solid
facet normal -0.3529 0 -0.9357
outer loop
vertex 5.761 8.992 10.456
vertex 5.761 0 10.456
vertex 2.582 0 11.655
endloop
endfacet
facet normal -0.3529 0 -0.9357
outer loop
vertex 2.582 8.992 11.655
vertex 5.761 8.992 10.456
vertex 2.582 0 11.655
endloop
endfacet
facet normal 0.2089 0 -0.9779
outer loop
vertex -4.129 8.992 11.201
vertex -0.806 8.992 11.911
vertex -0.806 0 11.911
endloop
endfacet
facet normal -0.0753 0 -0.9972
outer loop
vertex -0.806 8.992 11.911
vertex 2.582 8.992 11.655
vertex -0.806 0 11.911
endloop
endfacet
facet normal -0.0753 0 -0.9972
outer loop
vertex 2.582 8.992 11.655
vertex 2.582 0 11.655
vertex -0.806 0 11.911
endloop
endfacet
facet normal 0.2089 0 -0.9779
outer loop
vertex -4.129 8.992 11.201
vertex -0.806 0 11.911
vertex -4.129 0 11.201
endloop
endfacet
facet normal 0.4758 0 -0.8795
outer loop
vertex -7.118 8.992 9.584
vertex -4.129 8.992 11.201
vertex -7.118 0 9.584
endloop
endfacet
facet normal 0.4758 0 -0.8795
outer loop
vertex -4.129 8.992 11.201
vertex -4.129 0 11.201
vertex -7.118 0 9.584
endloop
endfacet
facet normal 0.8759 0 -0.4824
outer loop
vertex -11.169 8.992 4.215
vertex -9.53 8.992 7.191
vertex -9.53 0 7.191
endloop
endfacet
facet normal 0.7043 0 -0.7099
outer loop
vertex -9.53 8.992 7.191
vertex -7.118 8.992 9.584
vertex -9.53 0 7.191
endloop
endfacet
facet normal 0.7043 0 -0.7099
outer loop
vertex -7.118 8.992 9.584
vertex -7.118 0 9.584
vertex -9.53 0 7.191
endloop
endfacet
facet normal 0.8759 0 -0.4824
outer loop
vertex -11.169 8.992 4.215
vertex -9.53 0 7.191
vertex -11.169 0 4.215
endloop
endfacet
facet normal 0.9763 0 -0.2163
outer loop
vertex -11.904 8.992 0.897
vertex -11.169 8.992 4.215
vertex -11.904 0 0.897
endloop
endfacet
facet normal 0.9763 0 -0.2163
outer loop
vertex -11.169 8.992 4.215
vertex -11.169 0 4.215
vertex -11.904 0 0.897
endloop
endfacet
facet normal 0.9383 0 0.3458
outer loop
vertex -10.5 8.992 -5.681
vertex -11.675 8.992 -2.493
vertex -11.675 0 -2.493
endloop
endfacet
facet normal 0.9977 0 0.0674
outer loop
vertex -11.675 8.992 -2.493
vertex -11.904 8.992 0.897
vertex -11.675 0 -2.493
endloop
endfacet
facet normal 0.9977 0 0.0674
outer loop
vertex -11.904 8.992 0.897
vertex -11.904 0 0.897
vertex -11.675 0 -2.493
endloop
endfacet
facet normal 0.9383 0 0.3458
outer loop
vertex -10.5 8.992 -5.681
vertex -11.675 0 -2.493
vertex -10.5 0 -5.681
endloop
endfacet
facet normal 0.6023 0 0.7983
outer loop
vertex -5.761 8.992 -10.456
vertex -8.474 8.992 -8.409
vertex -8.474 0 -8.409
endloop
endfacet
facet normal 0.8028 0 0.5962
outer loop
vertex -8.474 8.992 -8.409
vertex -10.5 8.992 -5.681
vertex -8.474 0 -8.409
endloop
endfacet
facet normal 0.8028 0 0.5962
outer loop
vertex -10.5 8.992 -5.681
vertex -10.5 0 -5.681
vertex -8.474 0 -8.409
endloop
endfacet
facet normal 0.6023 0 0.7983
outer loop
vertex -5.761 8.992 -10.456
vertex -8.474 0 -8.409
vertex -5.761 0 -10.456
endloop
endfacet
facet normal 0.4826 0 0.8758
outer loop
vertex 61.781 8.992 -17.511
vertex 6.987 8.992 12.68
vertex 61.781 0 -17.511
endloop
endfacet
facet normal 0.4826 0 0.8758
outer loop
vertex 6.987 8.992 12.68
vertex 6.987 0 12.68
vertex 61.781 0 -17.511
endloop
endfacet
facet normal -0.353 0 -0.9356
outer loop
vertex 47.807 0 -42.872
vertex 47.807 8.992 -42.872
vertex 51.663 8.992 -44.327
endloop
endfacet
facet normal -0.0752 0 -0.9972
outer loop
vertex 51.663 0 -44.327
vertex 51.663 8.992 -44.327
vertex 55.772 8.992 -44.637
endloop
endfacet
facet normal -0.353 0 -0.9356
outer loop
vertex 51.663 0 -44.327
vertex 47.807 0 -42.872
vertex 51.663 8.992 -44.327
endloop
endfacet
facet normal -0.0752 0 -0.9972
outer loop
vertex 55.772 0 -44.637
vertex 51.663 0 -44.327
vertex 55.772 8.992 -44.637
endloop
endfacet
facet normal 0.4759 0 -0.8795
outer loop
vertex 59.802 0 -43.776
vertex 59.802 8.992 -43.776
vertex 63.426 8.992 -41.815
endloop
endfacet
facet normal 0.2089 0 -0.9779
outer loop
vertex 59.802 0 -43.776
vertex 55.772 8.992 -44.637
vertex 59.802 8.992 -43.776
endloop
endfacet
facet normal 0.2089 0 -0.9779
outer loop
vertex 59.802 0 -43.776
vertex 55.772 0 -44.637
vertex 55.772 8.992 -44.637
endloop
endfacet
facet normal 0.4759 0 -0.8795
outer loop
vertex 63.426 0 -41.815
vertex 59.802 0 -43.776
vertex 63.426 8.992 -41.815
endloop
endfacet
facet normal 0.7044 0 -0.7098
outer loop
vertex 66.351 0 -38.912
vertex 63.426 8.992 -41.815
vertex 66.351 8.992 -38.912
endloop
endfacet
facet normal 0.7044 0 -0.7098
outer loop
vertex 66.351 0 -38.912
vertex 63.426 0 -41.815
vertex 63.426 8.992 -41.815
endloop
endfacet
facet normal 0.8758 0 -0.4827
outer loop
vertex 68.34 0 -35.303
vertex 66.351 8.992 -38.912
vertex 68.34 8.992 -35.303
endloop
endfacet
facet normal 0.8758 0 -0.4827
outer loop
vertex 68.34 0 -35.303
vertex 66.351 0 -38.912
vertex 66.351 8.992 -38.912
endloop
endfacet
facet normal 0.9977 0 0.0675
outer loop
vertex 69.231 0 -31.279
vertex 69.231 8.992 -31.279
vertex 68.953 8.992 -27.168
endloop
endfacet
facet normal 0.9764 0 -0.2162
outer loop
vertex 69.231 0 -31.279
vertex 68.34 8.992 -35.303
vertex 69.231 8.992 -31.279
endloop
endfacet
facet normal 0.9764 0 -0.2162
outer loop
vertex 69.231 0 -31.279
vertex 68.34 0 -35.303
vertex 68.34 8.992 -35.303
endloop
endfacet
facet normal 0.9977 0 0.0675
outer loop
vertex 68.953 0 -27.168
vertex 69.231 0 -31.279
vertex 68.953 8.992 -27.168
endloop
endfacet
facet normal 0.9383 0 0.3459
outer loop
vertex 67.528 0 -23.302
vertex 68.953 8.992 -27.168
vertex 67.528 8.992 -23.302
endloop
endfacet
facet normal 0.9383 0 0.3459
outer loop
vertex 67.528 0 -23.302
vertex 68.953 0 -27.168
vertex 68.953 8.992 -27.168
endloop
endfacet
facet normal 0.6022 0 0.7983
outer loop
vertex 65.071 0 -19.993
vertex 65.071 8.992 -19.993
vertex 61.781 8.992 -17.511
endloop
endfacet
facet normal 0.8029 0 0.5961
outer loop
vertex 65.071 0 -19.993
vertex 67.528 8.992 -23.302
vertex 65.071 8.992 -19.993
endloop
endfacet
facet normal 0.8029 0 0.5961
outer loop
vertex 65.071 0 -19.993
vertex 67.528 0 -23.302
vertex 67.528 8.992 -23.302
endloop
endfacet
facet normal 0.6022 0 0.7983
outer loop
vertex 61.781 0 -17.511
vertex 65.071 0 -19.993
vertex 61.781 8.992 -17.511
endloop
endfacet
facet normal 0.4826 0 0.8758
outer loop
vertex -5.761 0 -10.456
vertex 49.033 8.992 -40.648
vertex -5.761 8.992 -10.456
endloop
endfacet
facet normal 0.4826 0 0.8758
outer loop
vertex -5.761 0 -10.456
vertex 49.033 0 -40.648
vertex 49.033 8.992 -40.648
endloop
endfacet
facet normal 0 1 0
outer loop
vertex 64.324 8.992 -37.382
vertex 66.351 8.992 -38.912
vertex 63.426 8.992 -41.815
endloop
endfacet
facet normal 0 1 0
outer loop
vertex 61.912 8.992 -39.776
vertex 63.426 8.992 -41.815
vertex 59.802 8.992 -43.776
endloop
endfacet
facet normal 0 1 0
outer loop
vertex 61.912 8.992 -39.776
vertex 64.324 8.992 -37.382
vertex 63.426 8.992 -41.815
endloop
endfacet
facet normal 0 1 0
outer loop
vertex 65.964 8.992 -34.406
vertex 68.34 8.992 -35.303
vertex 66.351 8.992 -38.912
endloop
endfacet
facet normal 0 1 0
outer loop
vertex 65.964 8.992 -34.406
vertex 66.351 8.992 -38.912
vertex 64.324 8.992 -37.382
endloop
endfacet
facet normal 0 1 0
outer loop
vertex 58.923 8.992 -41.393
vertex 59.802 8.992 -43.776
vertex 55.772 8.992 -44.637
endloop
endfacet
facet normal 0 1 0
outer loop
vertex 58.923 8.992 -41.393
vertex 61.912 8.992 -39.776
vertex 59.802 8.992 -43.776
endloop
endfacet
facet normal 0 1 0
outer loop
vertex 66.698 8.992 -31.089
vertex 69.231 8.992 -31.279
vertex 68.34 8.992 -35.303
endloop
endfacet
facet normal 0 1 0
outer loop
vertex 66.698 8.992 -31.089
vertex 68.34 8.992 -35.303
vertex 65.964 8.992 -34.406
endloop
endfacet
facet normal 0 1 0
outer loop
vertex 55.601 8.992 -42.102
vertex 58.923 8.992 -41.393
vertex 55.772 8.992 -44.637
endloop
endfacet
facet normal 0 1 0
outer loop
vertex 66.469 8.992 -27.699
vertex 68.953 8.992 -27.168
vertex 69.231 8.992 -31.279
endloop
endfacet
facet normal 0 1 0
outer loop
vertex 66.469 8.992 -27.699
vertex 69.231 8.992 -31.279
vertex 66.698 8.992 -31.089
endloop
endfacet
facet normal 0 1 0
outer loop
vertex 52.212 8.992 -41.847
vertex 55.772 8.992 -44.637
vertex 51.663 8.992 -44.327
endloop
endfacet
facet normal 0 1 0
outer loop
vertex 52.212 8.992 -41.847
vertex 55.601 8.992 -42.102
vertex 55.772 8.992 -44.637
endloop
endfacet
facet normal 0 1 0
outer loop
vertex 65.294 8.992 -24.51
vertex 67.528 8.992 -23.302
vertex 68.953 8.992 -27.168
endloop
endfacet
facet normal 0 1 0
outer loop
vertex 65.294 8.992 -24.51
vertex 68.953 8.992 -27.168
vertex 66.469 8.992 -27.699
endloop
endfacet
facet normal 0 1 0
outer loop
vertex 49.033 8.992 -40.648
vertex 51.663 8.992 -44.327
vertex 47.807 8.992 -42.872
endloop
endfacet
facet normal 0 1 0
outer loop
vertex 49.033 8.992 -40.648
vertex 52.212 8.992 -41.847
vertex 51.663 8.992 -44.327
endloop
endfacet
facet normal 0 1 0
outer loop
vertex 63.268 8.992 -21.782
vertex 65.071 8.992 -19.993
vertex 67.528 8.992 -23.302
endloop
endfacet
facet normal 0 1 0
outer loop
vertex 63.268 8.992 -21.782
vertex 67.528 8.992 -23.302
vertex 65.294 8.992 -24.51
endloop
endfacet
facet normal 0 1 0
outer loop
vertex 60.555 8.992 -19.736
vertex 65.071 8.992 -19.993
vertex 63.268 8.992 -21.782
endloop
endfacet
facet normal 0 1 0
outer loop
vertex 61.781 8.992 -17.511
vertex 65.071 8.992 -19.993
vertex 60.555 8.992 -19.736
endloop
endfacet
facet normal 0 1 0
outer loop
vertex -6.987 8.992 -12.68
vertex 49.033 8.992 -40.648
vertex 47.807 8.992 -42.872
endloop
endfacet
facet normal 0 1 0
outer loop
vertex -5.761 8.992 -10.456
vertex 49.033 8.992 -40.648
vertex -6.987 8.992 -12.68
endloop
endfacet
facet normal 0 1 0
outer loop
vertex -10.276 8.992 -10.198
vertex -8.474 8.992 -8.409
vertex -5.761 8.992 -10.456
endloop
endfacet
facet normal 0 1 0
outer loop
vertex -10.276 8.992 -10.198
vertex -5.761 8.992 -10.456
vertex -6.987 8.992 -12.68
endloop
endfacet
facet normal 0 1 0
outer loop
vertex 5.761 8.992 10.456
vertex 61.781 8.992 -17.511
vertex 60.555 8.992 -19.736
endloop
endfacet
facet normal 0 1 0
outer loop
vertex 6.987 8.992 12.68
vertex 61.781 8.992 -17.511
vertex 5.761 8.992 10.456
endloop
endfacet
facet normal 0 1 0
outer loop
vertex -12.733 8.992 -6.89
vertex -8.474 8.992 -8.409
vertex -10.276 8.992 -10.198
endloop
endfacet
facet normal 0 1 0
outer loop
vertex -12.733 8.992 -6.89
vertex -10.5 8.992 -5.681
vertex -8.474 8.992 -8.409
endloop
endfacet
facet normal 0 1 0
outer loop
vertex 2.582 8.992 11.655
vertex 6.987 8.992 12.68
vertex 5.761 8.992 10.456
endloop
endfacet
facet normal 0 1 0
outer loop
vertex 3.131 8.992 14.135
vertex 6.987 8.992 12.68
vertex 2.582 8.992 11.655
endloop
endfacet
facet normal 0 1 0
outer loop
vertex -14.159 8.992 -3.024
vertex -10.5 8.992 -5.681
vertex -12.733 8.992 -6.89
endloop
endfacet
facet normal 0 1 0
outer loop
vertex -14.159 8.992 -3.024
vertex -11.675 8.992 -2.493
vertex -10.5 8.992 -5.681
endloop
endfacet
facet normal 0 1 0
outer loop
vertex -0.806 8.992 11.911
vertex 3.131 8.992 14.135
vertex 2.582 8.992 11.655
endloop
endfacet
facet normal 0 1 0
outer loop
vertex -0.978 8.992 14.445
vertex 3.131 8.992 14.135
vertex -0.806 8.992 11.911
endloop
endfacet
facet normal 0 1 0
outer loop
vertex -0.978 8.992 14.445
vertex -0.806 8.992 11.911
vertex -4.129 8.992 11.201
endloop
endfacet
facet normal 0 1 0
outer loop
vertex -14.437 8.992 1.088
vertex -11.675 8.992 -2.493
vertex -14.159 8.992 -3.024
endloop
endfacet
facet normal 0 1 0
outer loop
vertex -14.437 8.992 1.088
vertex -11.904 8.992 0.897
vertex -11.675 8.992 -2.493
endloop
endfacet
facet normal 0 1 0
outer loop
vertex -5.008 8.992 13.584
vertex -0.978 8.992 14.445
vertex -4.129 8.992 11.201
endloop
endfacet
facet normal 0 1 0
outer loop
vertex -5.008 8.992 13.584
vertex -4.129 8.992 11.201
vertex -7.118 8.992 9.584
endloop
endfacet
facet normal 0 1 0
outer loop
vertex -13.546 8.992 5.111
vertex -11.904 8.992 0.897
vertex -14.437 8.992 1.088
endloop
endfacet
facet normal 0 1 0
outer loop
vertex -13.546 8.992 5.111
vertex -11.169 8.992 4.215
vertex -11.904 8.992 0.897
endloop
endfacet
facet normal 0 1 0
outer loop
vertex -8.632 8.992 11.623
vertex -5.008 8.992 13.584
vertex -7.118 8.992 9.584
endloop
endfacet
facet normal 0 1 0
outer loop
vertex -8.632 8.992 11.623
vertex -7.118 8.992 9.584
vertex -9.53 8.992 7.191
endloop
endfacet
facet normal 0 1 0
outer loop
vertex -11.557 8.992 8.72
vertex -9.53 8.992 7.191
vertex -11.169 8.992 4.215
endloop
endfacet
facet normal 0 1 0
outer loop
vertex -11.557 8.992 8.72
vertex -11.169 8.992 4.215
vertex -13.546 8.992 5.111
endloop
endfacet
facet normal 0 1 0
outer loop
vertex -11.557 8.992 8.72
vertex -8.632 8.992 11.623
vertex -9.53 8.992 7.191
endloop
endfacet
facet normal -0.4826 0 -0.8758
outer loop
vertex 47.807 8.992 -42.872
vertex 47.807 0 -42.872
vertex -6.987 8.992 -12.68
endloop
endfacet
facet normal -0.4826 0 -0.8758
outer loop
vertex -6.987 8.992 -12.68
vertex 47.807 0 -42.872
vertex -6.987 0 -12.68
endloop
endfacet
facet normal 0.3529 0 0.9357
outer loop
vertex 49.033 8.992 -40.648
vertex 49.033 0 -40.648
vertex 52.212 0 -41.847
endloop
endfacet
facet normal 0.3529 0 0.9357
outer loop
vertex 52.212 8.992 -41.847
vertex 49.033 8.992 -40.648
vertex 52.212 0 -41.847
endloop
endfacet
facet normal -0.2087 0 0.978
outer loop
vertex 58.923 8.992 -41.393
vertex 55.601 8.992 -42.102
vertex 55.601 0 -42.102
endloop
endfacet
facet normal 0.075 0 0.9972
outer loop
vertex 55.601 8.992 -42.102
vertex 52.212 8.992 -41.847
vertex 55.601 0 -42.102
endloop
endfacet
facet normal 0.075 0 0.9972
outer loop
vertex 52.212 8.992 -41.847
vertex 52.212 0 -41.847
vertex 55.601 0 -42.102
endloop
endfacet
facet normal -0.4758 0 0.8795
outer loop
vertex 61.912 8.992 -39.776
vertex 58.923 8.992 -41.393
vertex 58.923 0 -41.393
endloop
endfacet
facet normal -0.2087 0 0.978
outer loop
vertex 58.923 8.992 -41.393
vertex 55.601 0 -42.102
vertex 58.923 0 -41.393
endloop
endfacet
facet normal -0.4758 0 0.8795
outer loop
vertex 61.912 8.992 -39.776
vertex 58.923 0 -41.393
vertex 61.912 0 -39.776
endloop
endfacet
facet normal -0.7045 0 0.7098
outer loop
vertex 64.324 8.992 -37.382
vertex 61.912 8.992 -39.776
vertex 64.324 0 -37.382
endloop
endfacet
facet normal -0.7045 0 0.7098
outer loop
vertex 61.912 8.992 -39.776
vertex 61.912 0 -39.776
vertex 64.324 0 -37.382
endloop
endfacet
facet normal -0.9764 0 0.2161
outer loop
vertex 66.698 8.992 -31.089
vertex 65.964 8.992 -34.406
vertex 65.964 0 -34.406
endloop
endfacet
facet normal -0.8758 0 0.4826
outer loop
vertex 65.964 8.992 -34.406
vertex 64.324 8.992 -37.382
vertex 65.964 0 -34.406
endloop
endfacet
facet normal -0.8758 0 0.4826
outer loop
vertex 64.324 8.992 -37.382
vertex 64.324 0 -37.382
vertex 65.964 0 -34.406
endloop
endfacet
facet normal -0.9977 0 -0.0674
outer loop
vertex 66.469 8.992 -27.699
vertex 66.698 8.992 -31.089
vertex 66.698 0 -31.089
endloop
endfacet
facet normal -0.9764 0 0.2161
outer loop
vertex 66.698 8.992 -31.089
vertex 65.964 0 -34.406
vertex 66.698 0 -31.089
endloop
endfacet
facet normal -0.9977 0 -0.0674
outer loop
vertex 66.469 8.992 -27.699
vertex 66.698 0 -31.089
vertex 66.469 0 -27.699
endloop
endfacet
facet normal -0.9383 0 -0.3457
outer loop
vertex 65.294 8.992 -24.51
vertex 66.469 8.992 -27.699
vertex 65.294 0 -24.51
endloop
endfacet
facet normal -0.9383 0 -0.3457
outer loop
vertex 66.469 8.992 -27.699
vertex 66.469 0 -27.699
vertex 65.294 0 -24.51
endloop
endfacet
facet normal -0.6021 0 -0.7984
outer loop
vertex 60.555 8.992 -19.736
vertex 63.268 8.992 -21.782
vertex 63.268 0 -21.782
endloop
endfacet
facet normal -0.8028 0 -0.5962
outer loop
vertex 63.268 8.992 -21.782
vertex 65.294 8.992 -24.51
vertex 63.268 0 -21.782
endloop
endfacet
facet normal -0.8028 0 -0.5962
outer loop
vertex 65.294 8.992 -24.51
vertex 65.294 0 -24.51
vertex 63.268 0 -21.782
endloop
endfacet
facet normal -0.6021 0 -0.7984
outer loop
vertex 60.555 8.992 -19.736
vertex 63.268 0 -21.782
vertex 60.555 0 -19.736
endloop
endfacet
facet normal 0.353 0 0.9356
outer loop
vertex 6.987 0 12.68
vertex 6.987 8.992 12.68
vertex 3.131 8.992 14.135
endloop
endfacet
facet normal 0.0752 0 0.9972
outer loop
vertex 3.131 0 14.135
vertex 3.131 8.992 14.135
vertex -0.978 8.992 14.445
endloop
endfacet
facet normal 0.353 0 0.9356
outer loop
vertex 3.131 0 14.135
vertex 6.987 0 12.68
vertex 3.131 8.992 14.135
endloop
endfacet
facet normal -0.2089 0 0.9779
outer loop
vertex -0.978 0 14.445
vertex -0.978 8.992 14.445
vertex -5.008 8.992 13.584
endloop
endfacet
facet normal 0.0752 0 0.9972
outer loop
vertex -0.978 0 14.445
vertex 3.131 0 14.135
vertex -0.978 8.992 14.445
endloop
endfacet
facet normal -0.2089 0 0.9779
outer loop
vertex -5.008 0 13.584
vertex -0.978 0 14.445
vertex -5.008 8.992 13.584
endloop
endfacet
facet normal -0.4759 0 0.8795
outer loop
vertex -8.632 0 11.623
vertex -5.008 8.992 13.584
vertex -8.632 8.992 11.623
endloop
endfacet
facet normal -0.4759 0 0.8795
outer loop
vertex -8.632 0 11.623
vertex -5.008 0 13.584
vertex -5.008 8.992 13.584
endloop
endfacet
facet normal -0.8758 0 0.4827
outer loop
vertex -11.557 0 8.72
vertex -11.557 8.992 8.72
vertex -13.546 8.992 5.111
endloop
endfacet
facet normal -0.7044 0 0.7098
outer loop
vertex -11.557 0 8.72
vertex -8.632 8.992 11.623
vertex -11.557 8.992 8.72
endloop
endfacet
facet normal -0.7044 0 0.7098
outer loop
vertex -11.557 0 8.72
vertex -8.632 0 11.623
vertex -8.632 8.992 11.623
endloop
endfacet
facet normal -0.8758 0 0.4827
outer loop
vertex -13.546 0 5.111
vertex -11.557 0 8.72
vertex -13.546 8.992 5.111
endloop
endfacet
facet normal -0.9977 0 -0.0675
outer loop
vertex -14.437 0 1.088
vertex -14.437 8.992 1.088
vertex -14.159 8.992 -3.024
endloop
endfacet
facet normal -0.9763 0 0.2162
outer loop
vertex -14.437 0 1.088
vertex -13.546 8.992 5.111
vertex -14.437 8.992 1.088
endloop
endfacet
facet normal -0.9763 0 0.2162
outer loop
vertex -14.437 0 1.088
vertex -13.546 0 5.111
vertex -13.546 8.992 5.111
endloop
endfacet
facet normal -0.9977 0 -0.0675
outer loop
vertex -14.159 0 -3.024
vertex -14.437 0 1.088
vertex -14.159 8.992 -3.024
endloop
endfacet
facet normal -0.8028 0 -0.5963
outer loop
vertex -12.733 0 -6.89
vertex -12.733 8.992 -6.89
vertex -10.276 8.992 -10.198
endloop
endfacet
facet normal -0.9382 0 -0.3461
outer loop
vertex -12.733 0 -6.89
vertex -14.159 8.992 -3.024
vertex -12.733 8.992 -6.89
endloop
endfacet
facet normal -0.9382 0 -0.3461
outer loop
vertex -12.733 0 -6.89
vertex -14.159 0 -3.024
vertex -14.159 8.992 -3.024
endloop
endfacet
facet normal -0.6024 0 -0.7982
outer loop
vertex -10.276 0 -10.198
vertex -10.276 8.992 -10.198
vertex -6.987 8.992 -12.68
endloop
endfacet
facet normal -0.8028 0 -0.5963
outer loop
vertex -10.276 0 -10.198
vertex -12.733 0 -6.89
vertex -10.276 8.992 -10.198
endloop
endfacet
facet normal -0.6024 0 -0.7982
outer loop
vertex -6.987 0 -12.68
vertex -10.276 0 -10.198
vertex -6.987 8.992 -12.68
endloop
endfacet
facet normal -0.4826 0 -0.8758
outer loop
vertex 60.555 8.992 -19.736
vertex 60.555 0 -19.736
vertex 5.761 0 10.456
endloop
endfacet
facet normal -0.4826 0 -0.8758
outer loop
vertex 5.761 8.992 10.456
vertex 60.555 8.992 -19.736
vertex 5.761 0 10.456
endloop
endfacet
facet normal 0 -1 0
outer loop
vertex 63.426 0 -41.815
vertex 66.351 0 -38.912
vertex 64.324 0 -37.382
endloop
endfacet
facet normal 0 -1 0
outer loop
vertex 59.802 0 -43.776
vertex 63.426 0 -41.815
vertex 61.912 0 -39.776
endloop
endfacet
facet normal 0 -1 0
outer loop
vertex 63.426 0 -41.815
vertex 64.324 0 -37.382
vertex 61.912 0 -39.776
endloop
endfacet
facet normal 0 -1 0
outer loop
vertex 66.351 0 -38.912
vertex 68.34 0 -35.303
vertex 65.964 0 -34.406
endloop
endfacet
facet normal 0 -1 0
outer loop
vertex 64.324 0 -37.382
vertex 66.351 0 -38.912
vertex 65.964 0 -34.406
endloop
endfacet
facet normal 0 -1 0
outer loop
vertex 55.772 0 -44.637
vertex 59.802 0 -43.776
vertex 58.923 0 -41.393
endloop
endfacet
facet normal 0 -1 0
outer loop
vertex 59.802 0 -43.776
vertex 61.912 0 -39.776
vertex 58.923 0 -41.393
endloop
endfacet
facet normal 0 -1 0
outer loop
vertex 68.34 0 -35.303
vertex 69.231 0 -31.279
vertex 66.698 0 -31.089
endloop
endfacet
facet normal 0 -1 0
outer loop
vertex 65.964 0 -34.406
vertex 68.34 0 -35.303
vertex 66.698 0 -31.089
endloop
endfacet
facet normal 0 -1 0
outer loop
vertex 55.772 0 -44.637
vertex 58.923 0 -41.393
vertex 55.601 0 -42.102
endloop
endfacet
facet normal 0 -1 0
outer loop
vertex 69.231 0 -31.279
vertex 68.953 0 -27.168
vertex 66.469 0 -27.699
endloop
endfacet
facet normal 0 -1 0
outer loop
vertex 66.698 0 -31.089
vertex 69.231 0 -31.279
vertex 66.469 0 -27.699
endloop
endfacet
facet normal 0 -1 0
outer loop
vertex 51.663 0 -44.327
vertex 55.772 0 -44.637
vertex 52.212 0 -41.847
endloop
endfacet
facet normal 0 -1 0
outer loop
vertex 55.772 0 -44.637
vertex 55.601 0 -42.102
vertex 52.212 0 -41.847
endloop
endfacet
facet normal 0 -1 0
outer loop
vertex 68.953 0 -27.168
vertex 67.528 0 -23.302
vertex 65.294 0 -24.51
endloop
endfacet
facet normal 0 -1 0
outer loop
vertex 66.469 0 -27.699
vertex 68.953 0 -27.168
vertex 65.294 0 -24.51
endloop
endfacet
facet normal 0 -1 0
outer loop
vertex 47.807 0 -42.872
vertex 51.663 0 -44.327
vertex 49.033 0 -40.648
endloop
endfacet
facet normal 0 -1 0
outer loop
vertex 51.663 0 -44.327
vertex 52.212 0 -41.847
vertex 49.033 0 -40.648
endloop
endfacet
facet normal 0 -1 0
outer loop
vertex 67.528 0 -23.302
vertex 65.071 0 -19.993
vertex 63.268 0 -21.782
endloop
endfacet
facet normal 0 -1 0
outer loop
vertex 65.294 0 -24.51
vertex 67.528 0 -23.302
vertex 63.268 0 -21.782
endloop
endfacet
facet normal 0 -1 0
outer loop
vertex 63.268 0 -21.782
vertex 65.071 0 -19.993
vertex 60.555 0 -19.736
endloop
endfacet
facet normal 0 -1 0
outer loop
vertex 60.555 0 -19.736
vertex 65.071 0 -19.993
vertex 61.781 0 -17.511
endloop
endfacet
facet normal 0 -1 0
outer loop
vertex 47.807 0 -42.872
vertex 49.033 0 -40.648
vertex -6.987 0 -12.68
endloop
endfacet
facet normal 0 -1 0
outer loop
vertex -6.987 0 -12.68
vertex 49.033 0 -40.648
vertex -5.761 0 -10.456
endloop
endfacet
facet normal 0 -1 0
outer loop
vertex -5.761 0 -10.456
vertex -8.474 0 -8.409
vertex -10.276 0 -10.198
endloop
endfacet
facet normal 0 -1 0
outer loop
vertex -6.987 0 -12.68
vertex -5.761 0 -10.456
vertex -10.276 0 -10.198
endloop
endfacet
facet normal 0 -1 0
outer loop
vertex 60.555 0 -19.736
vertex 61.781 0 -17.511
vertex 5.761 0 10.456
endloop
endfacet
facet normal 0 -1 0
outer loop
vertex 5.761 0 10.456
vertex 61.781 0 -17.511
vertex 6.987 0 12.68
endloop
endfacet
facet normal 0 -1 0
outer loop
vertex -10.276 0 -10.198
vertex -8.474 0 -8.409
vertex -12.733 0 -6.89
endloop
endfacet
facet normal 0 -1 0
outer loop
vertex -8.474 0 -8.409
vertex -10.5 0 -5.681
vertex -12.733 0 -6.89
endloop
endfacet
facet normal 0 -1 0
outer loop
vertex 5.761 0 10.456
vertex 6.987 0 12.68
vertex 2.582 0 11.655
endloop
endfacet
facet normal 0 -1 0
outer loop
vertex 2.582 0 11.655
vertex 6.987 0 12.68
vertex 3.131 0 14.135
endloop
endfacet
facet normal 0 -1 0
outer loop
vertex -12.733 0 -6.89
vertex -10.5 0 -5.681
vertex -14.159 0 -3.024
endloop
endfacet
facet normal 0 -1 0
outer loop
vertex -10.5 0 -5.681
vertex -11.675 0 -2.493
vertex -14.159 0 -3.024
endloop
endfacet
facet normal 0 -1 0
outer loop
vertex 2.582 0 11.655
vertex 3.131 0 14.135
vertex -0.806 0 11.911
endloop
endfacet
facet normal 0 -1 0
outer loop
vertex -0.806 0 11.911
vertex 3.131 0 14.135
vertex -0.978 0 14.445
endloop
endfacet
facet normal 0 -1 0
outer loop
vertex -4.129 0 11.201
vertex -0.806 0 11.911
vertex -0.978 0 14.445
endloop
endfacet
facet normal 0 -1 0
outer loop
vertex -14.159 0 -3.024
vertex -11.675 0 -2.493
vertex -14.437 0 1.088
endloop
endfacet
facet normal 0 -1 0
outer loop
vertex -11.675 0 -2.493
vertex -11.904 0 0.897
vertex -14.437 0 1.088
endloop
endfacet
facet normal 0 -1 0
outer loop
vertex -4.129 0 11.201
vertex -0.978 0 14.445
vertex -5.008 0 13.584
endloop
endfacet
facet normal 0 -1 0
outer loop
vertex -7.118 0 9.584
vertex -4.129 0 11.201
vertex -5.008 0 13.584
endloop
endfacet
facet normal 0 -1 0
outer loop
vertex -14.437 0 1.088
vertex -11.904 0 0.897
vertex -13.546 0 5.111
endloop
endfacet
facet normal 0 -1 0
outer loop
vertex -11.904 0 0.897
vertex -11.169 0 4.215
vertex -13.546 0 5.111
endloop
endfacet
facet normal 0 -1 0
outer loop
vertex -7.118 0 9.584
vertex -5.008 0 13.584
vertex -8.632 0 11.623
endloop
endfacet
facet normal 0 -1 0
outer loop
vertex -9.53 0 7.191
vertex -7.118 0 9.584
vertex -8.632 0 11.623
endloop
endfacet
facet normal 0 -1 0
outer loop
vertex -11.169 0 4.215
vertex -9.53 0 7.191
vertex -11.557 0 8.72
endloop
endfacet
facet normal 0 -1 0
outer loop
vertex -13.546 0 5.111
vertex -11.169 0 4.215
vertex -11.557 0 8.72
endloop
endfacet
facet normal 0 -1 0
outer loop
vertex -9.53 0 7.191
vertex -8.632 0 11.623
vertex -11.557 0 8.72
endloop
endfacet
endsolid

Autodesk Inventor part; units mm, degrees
ref_plane "YZ Plane" through (0, 0, 0) normal (1, 0, 0) x (0, 1, 0)
ref_plane "XZ Plane" through (0, 0, 0) normal (0, 1, 0) x (-1, 0, 0)
ref_plane "XY Plane" through (0, 0, 0) normal (0, 0, 1) x (1, 0, 0)
sketch "Sketch1" plane through (0, 0, 0) normal (0, 1, 0) x (-1, 0, 0)
  circle A0 centre (0, 0) radius 11.938 construction
  line L0 (0, 0) -> (-54.7943, -30.1916) construction
  line L1 (0, 0) -> (-11.938, 0) construction
  circle A1 centre (-54.7943, -30.1916) radius 11.938 construction
  line L2 (-49.0331, -40.6475) -> (5.7612, -10.4559)
  line L3 (-60.5554, -19.7358) -> (-5.7612, 10.4559)
  arc A2 (-60.5554, -19.7358) -> (-49.0331, -40.6475) centre (-54.7943, -30.1916) ccw
  arc A3 (5.7612, -10.4559) -> (-5.7612, 10.4559) centre (0, 0) ccw
  line L4 (-6.9869, 12.6805) -> (-61.7812, -17.5111)
  arc A4 (-61.7812, -17.5111) -> (-47.8073, -42.8721) centre (-54.7943, -30.1916) ccw
  line L5 (-47.8073, -42.8721) -> (6.9869, -12.6805)
  arc A5 (6.9869, -12.6805) -> (-6.9869, 12.6805) centre (0, 0) ccw
  dimension "d11" = 23.876
  dimension "d12" = 28.855
  dimension "d13" = 62.5615
  dimension "d14" = 2.54
extrude "Extrusion2" add sketch "Sketch1" along normal blind 8.9916
properties part number "INtk_010_Belt2" material "Rubber, Silicone"
